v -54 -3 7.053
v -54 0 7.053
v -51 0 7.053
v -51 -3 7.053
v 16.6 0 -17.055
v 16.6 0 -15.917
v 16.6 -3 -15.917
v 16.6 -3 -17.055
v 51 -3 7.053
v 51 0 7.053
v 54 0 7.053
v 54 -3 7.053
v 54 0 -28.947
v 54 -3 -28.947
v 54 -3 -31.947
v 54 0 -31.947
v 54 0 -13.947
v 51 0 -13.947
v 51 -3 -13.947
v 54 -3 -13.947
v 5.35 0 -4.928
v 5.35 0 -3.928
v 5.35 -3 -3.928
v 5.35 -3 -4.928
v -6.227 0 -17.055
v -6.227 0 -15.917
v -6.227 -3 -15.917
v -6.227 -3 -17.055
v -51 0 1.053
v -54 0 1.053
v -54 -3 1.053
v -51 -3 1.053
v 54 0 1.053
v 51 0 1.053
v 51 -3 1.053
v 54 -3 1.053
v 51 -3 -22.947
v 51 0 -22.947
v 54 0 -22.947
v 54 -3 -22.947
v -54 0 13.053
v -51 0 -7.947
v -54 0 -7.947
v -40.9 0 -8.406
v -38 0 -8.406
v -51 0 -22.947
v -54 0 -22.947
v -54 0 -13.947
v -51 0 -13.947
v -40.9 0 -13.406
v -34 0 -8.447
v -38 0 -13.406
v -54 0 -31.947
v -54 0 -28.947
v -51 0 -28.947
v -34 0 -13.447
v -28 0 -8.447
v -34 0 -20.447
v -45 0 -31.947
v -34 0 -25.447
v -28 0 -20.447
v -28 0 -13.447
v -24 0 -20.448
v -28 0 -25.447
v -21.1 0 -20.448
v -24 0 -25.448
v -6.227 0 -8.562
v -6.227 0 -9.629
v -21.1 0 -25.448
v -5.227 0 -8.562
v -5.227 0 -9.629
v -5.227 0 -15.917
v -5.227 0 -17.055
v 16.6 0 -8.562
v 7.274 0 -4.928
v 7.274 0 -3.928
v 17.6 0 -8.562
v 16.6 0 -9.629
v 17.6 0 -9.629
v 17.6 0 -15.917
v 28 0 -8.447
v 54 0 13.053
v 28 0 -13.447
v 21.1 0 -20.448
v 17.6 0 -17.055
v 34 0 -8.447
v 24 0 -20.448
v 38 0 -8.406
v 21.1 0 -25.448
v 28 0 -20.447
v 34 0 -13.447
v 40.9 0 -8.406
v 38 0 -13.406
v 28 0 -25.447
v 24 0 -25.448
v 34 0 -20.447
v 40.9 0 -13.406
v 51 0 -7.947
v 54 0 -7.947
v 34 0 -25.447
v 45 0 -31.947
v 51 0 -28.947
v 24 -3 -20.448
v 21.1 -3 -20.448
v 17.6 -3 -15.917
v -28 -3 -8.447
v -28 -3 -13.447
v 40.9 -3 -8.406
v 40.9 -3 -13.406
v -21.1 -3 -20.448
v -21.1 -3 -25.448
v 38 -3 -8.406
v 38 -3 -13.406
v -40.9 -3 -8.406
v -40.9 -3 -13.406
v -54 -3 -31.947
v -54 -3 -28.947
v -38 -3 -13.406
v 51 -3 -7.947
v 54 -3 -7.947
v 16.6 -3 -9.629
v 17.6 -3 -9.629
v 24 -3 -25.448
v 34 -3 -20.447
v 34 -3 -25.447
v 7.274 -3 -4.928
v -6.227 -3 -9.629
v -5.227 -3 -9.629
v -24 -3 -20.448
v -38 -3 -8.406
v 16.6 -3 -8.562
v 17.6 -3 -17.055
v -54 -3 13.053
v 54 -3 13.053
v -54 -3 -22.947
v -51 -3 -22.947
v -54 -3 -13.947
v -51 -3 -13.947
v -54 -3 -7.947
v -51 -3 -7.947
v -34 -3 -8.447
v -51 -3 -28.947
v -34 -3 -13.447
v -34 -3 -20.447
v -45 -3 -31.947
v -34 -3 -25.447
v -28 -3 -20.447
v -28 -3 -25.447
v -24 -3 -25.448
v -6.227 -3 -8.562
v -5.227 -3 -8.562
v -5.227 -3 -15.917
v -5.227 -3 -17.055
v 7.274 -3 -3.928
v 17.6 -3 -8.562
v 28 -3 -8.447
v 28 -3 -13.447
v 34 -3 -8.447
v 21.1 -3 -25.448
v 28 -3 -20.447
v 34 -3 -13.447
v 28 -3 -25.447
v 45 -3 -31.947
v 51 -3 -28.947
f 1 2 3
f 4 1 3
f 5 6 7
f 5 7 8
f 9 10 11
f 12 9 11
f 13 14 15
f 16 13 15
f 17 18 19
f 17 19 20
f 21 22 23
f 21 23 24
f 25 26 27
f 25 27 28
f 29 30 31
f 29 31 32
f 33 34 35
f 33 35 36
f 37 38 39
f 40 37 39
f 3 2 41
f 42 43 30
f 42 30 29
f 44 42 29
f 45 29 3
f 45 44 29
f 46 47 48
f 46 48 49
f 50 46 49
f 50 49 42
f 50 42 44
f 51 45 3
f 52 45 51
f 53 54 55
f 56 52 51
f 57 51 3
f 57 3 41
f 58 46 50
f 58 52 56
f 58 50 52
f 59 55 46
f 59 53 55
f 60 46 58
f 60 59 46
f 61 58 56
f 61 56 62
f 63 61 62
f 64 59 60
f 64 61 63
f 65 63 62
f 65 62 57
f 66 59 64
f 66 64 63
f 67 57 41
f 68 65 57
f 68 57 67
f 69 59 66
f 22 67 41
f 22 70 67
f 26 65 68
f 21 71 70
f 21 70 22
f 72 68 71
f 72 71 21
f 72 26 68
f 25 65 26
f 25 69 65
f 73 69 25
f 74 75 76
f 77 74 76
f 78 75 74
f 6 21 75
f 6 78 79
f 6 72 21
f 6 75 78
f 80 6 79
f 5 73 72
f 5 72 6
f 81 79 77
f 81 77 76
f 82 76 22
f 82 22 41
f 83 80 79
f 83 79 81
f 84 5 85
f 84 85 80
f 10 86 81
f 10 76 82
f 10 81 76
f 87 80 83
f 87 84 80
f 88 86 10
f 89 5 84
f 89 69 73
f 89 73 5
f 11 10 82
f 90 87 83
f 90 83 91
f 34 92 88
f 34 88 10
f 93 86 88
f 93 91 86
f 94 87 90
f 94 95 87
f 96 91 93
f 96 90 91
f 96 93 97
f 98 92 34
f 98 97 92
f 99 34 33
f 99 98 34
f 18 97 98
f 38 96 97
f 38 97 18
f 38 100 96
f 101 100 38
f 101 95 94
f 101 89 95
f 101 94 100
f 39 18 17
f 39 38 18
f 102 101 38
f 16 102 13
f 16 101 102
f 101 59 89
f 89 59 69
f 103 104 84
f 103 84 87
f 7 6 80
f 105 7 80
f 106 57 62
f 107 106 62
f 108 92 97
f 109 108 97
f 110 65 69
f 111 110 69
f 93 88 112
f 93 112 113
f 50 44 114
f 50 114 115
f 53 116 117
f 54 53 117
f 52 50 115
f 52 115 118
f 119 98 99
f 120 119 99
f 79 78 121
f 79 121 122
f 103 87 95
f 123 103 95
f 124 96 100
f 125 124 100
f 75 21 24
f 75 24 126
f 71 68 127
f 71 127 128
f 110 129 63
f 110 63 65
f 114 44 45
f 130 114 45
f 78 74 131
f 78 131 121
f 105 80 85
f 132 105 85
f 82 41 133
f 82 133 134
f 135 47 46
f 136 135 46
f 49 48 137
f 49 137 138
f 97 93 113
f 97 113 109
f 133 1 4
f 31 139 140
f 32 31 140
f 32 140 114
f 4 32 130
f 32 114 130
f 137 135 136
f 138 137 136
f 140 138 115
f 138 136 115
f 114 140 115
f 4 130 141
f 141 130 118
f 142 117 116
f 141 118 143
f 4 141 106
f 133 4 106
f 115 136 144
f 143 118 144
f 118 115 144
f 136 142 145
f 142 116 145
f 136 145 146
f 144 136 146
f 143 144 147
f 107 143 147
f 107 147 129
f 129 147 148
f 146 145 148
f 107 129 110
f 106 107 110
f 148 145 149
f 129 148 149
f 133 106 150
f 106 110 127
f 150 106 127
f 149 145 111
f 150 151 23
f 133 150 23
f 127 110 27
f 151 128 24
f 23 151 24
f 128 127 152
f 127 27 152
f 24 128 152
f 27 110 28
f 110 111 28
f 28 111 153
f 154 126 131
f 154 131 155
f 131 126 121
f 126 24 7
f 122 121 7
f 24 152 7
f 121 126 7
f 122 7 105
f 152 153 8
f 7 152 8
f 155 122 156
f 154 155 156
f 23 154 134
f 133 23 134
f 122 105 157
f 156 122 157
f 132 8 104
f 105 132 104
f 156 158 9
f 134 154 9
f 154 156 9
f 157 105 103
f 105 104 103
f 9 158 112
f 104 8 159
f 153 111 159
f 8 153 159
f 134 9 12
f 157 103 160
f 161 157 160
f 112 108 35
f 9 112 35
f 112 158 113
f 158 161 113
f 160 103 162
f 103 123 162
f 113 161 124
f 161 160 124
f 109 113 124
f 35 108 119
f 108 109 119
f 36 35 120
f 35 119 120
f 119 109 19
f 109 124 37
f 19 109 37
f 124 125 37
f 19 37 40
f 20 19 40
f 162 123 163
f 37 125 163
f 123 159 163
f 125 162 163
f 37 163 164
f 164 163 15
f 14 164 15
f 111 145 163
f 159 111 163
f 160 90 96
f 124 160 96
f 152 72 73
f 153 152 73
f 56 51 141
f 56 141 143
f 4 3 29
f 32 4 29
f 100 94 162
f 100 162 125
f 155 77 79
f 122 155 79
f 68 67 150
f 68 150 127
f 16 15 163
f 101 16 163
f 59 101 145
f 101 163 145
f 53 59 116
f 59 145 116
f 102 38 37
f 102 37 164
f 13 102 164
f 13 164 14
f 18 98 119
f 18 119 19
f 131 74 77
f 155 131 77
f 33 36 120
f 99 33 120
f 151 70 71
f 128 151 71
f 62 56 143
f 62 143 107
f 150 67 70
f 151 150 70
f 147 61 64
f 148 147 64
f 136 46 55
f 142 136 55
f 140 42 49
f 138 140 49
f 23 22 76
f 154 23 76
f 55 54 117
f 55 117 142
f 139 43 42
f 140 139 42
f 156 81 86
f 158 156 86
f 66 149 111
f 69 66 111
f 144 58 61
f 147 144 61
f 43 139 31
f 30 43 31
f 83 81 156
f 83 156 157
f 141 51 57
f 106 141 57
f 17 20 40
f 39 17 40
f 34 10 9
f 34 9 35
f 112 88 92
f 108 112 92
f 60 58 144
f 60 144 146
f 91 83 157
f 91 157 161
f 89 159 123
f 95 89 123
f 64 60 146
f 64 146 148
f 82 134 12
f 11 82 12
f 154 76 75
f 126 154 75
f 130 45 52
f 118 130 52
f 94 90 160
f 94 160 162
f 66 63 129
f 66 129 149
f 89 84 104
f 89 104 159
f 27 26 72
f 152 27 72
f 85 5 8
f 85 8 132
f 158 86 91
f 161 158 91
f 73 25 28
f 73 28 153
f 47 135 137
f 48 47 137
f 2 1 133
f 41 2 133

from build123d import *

# Parameters (mm, degrees)
SKETCH1_W          = 2.9
SKETCH1_H          = 5
SKETCH1_W_2        = 6
BASE_FLANGE1_DEPTH = 3
SKETCH25_W         = 9
SKETCH25_H         = 9.641148945
SKETCH25_W_2       = 7.205840792
CUT_EXTRUDE2_DEPTH = 10
SKETCH31_W         = 3
SKETCH31_H         = 6
CUT_EXTRUDE3_DEPTH = 10
SKETCH32_W         = 1
SKETCH32_H         = 1.138346555
SKETCH32_H_2       = 1.067484408
SKETCH32_W_2       = 1.923552289
SKETCH32_H_3       = 1
CUT_EXTRUDE4_DEPTH = 10


# Sheet-metal steps are written as plain solids
with BuildPart() as part:
    # Sketch1 → Base-Flange1 (new body)
    with BuildSketch(Plane(origin=(0, 0, 0), x_dir=(1, 0, 0), z_dir=(0, 1, 0))):
        Polygon((-80, 31.946571622), (-80, -13.053428378), (80, -13.053428378), (80, 31.946571622), (80, 41.587720567), (45, 41.587720567), (45, 31.946571622), (-45, 31.946571622), (-45, 41.587720567), (-80, 41.587720567), align=None)
        with Locations((-39.45, 10.905641405)):
            Rectangle(SKETCH1_W, SKETCH1_H, mode=Mode.SUBTRACT)
        with Locations((-22.55, 22.947848405)):
            Rectangle(SKETCH1_W, SKETCH1_H, mode=Mode.SUBTRACT)
        with Locations((-31, 22.946571622)):
            Rectangle(SKETCH1_W_2, SKETCH1_H, mode=Mode.SUBTRACT)
        with Locations((-31, 10.946571622)):
            Rectangle(SKETCH1_W_2, SKETCH1_H, mode=Mode.SUBTRACT)
        with Locations((31, 10.946571622)):
            Rectangle(SKETCH1_W_2, SKETCH1_H, mode=Mode.SUBTRACT)
        with Locations((31, 22.946571622)):
            Rectangle(SKETCH1_W_2, SKETCH1_H, mode=Mode.SUBTRACT)
        with Locations((22.55, 22.947848405)):
            Rectangle(SKETCH1_W, SKETCH1_H, mode=Mode.SUBTRACT)
        with Locations((39.45, 10.905641405)):
            Rectangle(SKETCH1_W, SKETCH1_H, mode=Mode.SUBTRACT)
    extrude(amount=-BASE_FLANGE1_DEPTH)

    # Sketch25 → Cut-Extrude2 (cut)
    with BuildSketch(Plane.XZ.offset(3)):
        Polygon((80, 13.053428378), (54, 13.053428378), (54, -31.946571622), (61.205840792, -31.946571622), (61.205840792, -41.587720567), (80, -41.587720567), align=None)
        with Locations((49.5, -36.767146095)):
            Rectangle(SKETCH25_W, SKETCH25_H)
        with Locations((57.602920396, -36.767146095)):
            Rectangle(SKETCH25_W_2, SKETCH25_H)
        with Locations((-49.5, -36.767146095)):
            Rectangle(SKETCH25_W, SKETCH25_H)
        with Locations((-57.602920396, -36.767146095)):
            Rectangle(SKETCH25_W_2, SKETCH25_H)
        Polygon((-54, -31.946571622), (-54, 13.053428378), (-80, 13.053428378), (-80, -41.587720567), (-61.205840792, -41.587720567), (-61.205840792, -31.946571622), align=None)
    extrude(amount=-CUT_EXTRUDE2_DEPTH, mode=Mode.SUBTRACT)

    # Sketch31 → Cut-Extrude3 (cut)
    with BuildSketch(Plane(origin=(0, 0, 0), x_dir=(1, 0, 0), z_dir=(0, 1, 0))):
        with Locations((52.5, 25.946571622)):
            Rectangle(SKETCH31_W, SKETCH31_H)
        with Locations((52.5, 10.946571622)):
            Rectangle(SKETCH31_W, SKETCH31_H)
        with Locations((52.5, -4.053428378)):
            Rectangle(SKETCH31_W, SKETCH31_H)
        with Locations((-52.5, 25.946571622)):
            Rectangle(SKETCH31_W, SKETCH31_H)
        with Locations((-52.5, 10.946571622)):
            Rectangle(SKETCH31_W, SKETCH31_H)
        with Locations((-52.5, -4.053428378)):
            Rectangle(SKETCH31_W, SKETCH31_H)
    extrude(amount=-CUT_EXTRUDE3_DEPTH, mode=Mode.SUBTRACT)

    # Sketch32 → Cut-Extrude4 (cut)
    with BuildSketch(Plane(origin=(0, 0, 0), x_dir=(1, 0, 0), z_dir=(0, 1, 0))):
        with Locations((-5.726537828, 16.486113061)):
            Rectangle(SKETCH32_W, SKETCH32_H)
        with Locations((-5.726537828, 9.095449689)):
            Rectangle(SKETCH32_W, SKETCH32_H_2)
        with Locations((17.1, 16.486113061)):
            Rectangle(SKETCH32_W, SKETCH32_H)
        with Locations((17.1, 9.095449689)):
            Rectangle(SKETCH32_W, SKETCH32_H_2)
        with Locations((6.311776145, 4.428231045)):
            Rectangle(SKETCH32_W_2, SKETCH32_H_3)
    extrude(amount=-CUT_EXTRUDE4_DEPTH, mode=Mode.SUBTRACT)


solid = part.part
